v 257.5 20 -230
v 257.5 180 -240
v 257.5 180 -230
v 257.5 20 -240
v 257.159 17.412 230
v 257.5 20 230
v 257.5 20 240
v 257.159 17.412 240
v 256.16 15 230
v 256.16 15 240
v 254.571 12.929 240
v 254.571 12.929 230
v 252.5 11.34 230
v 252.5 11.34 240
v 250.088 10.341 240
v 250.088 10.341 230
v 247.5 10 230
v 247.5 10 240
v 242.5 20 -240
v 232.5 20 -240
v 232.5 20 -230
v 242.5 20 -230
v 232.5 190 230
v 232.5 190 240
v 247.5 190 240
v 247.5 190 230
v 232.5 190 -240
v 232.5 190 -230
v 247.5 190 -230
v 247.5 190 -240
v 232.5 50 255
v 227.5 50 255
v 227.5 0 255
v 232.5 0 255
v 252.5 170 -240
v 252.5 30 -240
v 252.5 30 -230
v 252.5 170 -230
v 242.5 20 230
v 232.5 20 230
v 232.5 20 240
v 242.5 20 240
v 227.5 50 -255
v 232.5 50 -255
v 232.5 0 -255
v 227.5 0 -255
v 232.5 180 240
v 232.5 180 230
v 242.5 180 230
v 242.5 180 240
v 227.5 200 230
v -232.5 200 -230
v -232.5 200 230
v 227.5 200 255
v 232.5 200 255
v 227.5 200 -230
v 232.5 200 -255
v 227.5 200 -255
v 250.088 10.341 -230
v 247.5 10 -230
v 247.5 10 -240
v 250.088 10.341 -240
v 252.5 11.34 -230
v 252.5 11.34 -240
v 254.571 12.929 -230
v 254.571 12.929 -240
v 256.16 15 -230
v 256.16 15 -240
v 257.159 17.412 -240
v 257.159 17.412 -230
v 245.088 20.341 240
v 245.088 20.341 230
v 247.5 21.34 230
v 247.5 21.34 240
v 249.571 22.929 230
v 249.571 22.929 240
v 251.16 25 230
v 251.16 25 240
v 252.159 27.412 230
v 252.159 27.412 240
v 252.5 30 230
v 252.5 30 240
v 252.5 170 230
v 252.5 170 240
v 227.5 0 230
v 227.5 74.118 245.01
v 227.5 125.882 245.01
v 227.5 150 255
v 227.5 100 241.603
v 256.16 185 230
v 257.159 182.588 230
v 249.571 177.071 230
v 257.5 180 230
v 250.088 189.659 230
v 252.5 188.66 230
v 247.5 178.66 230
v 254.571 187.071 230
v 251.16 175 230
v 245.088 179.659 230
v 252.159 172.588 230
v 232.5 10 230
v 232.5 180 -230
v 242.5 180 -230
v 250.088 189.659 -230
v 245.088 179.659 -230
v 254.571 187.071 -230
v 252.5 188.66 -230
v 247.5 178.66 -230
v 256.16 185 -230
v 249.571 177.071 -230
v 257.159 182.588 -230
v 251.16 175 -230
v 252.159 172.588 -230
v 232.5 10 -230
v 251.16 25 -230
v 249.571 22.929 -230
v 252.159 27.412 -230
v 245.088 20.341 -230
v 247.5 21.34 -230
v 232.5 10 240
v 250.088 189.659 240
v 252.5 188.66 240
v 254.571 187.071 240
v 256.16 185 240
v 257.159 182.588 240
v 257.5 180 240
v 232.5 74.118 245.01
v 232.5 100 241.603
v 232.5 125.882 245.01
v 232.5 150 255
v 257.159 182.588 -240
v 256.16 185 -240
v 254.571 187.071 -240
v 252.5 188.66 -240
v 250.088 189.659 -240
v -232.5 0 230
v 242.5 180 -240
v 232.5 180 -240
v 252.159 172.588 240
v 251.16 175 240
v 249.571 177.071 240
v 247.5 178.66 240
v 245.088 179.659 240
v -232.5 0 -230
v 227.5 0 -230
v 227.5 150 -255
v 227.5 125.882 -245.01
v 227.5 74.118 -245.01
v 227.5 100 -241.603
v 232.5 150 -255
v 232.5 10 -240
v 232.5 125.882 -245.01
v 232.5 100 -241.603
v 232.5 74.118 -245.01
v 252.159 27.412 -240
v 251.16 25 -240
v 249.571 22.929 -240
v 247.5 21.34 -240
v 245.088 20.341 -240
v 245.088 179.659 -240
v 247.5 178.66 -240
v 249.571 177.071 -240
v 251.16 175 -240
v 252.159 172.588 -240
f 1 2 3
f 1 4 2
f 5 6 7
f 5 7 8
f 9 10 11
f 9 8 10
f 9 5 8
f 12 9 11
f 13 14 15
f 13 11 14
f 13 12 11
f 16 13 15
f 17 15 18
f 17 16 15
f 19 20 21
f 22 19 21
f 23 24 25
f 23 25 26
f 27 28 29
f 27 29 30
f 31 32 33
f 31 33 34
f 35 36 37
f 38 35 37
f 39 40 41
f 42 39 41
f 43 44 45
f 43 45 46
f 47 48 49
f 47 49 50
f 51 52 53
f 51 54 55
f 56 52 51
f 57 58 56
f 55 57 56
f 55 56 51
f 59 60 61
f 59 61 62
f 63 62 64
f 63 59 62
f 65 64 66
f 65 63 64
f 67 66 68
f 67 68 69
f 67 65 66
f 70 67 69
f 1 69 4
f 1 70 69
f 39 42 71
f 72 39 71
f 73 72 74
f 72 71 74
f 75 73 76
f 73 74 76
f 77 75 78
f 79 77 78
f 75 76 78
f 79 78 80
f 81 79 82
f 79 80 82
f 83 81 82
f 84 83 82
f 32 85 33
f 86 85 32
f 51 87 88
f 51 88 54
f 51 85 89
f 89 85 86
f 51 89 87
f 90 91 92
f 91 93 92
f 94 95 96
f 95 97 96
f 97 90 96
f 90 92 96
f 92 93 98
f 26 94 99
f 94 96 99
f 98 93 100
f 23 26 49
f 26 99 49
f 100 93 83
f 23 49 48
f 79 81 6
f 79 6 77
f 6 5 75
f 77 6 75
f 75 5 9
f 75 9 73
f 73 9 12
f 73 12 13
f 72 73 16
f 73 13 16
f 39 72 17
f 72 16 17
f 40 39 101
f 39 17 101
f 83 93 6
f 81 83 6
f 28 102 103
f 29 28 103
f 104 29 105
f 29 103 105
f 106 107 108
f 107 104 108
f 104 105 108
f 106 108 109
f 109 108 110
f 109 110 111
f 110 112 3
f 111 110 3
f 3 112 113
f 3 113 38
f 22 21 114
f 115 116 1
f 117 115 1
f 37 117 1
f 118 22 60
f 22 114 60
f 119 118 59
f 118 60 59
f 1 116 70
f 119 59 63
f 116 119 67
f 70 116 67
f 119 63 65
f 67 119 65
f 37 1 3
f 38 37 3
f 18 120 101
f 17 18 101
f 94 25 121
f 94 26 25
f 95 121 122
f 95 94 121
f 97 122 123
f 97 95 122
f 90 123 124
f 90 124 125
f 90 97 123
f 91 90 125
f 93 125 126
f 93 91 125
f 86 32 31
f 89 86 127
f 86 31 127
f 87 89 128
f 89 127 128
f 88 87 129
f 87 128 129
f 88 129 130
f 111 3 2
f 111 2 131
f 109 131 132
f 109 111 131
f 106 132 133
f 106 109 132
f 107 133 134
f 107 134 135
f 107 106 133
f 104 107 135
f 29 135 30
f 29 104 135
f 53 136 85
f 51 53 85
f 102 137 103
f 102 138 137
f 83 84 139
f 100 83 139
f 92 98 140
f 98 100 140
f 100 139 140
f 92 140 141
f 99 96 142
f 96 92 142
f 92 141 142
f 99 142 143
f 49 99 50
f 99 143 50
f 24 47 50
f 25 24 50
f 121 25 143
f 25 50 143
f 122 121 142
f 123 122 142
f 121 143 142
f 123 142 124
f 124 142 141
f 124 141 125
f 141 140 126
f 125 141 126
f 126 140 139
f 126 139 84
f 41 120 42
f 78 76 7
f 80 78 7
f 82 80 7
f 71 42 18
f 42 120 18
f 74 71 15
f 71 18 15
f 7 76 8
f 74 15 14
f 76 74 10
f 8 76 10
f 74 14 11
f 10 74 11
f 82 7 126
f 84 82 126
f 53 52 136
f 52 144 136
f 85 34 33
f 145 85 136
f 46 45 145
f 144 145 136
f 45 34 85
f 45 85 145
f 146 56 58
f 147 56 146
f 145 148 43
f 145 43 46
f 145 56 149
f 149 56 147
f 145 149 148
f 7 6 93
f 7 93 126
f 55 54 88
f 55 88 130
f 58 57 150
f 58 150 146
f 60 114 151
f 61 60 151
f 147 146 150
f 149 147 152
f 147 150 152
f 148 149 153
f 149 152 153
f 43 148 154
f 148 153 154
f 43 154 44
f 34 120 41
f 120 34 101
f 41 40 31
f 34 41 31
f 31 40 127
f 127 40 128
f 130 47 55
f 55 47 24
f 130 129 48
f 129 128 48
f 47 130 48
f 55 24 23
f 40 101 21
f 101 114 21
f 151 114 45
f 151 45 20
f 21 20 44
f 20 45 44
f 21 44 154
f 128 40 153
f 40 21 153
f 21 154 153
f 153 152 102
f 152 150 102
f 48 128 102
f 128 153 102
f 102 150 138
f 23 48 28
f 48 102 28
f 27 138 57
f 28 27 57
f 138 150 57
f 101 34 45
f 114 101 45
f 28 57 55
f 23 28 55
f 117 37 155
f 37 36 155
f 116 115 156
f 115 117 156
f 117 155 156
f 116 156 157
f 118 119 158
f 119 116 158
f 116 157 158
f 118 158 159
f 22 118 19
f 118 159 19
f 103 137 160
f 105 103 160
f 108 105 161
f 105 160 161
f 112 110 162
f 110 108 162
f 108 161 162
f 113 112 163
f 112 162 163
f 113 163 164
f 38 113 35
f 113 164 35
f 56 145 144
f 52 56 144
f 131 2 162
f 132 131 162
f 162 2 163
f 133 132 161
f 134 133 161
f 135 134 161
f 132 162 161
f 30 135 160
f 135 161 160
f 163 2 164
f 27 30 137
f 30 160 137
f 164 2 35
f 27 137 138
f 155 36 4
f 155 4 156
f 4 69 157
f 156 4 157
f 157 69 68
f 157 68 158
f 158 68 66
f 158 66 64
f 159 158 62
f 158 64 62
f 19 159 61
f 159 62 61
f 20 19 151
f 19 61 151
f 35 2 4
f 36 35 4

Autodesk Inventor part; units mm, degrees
ref_plane "YZ Plane" through (0, 0, 0) normal (1, 0, 0) x (0, 1, 0)
ref_plane "XZ Plane" through (0, 0, 0) normal (0, 1, 0) x (-1, 0, 0)
ref_plane "XY Plane" through (0, 0, 0) normal (0, 0, 1) x (1, 0, 0)
sketch "Sketch1" plane through (0, 0, 0) normal (0, 1, 0) x (-1, 0, 0)
  line L0 (232.5, 230) -> (-232.5, 230)
  line L1 (-232.5, 230) -> (-232.5, -230)
  line L2 (-232.5, -230) -> (232.5, -230)
  line L3 (232.5, -230) -> (232.5, 230)
  line L4 (232.5, 230) -> (-232.5, -230) construction
  line L5 (-232.5, 230) -> (232.5, -230) construction
  point P0 (0, 0)
  dimension "d0" = 465
  dimension "d1" = 460
extrude "Extrusion1" add sketch "Sketch1" along normal blind 200
sketch "Sketch3" plane through (232.5, 0, -230) normal (0, 0, -1) x (-1, 0, 0)
  line L0 (0, 0) -> (0, 200) projected
  line L1 (0, 200) -> (5, 200)
  line L2 (0, 200) -> (465, 200) projected
  line L3 (5, 200) -> (5, 0)
  line L4 (5, 0) -> (0, 0)
  line L5 (0, 0) -> (0, 200)
  point P0 (232.5, 0)
  dimension "d6" = 5
extrude "Extrusion3" add sketch "Sketch3" along normal blind 25
sketch "Sketch4" plane through (-232.5, 0, 230) normal (0, 0, 1) x (1, 0, 0)
  line L0 (465, 0) -> (465, 200) projected
  line L1 (465, 200) -> (465, 0)
  line L2 (465, 0) -> (460, 0)
  line L3 (0, 0) -> (465, 0) projected
  line L4 (460, 0) -> (460, 200)
  line L5 (0, 200) -> (465, 200) projected
  point P0 (232.5, 0)
  dimension "d10" = 5
extrude "Extrusion4" add sketch "Sketch4" along normal blind 25
sketch "Sketch5" plane through (232.5, 0, -255) normal (1, 0, 0) x (0, 0, -1)
  line L0 (-510, 100) -> (0, 100)
  line L1 (0, 200) -> (0, 0) projected
  line L2 (-510, 100) -> (-510, 150)
  line L3 (-510, 0) -> (-510, 200) projected
  line L4 (-510, 100) -> (-510, 50)
  line L5 (-510, 100) -> (-460, 100) construction
  arc A0 (-510, 50) -> (-510, 150) centre (-596.6025, 100) ccw
  line L6 (0, 100) -> (0, 150)
  line L7 (0, 100) -> (0, 50)
  arc A1 (0, 150) -> (0, 50) centre (86.6025, 100) ccw
  point P0 (-255, 0)
  point P1 (-510, 50)
  dimension "d13" = 50
  dimension "d14" = 50
  dimension "d15" = 90
  dimension "d16" = 100
  dimension "d17" = 50
  dimension "d18" = 100
extrude "Extrusion5" cut sketch "Sketch5" against normal blind 25
sketch "Sketch6" plane through (232.5, 0, 255) normal (1, 0, 0) x (0, 0, -1)
  line L0 (25, 0) -> (25, 200) projected
  line L1 (25, 190) -> (25, 180)
  line L2 (25, 180) -> (15, 180)
  line L3 (15, 180) -> (15, 190)
  line L4 (15, 190) -> (25, 190)
  point P0 (255, 0)
  point P1 (0, 200)
  dimension "d22" = 10
  dimension "d23" = 10
extrude "Extrusion6" add sketch "Sketch6" along normal blind 25
mirror "Mirror1" about plane through (0, 0, 0) normal (0, 0, 1) of "Extrusion6"
sketch "Sketch7" plane through (232.5, 0, 255) normal (1, 0, 0) x (0, 0, -1)
  line L0 (0, 0) -> (510, 0) projected
  line L1 (0, 50) -> (0, 0) projected
  line L2 (25, 0) -> (25, 200) projected
  line L3 (25, 10) -> (25, 20)
  line L4 (25, 20) -> (15, 20)
  line L5 (15, 20) -> (15, 10)
  line L6 (15, 10) -> (25, 10)
  point P0 (255, 0)
  dimension "d27" = 10
  dimension "d28" = 10
extrude "Extrusion7" add sketch "Sketch7" along normal blind 25
mirror "Mirror2" about plane through (0, 0, 0) normal (0, 0, 1) of "Extrusion7"
sketch "Sketch8" plane through (232.5, 20, 240) normal (0, 1, 0) x (1, 0, 0)
  line L0 (25, 10) -> (25, 0) projected
  line L1 (25, 0) -> (25, 10)
  line L2 (25, 10) -> (20, 10)
  line L3 (0, 10) -> (25, 10) projected
  line L4 (20, 10) -> (20, 0)
  line L5 (0, 0) -> (25, 0) projected
  line L6 (25, 0) -> (20, 0)
  point P0 (-232.5, 240)
  dimension "d31" = 5
  dimension "d32" = 90
extrude "Extrusion8" add sketch "Sketch8" along normal blind 160
mirror "Mirror3" about plane through (0, 0, 0) normal (0, 0, 1) of "Extrusion8"
fillet "Face Fillet1" radius 10 1 edges at (252.5, 20, 235)
fillet "Face Fillet2" radius 10 1 edges at (257.5, 10, 235)
fillet "Face Fillet3" radius 10 1 edges at (257.5, 10, -235)
fillet "Face Fillet4" radius 10 1 edges at (257.5, 190, -235)
fillet "Face Fillet5" radius 10 1 edges at (257.5, 190, 235)
fillet "Face Fillet6" radius 10 1 edges at (252.5, 20, -235)
fillet "Face Fillet7" radius 10 1 edges at (252.5, 180, -235)
fillet "Face Fillet8" radius 10 1 edges at (252.5, 180, 235)
properties part number "PC"
